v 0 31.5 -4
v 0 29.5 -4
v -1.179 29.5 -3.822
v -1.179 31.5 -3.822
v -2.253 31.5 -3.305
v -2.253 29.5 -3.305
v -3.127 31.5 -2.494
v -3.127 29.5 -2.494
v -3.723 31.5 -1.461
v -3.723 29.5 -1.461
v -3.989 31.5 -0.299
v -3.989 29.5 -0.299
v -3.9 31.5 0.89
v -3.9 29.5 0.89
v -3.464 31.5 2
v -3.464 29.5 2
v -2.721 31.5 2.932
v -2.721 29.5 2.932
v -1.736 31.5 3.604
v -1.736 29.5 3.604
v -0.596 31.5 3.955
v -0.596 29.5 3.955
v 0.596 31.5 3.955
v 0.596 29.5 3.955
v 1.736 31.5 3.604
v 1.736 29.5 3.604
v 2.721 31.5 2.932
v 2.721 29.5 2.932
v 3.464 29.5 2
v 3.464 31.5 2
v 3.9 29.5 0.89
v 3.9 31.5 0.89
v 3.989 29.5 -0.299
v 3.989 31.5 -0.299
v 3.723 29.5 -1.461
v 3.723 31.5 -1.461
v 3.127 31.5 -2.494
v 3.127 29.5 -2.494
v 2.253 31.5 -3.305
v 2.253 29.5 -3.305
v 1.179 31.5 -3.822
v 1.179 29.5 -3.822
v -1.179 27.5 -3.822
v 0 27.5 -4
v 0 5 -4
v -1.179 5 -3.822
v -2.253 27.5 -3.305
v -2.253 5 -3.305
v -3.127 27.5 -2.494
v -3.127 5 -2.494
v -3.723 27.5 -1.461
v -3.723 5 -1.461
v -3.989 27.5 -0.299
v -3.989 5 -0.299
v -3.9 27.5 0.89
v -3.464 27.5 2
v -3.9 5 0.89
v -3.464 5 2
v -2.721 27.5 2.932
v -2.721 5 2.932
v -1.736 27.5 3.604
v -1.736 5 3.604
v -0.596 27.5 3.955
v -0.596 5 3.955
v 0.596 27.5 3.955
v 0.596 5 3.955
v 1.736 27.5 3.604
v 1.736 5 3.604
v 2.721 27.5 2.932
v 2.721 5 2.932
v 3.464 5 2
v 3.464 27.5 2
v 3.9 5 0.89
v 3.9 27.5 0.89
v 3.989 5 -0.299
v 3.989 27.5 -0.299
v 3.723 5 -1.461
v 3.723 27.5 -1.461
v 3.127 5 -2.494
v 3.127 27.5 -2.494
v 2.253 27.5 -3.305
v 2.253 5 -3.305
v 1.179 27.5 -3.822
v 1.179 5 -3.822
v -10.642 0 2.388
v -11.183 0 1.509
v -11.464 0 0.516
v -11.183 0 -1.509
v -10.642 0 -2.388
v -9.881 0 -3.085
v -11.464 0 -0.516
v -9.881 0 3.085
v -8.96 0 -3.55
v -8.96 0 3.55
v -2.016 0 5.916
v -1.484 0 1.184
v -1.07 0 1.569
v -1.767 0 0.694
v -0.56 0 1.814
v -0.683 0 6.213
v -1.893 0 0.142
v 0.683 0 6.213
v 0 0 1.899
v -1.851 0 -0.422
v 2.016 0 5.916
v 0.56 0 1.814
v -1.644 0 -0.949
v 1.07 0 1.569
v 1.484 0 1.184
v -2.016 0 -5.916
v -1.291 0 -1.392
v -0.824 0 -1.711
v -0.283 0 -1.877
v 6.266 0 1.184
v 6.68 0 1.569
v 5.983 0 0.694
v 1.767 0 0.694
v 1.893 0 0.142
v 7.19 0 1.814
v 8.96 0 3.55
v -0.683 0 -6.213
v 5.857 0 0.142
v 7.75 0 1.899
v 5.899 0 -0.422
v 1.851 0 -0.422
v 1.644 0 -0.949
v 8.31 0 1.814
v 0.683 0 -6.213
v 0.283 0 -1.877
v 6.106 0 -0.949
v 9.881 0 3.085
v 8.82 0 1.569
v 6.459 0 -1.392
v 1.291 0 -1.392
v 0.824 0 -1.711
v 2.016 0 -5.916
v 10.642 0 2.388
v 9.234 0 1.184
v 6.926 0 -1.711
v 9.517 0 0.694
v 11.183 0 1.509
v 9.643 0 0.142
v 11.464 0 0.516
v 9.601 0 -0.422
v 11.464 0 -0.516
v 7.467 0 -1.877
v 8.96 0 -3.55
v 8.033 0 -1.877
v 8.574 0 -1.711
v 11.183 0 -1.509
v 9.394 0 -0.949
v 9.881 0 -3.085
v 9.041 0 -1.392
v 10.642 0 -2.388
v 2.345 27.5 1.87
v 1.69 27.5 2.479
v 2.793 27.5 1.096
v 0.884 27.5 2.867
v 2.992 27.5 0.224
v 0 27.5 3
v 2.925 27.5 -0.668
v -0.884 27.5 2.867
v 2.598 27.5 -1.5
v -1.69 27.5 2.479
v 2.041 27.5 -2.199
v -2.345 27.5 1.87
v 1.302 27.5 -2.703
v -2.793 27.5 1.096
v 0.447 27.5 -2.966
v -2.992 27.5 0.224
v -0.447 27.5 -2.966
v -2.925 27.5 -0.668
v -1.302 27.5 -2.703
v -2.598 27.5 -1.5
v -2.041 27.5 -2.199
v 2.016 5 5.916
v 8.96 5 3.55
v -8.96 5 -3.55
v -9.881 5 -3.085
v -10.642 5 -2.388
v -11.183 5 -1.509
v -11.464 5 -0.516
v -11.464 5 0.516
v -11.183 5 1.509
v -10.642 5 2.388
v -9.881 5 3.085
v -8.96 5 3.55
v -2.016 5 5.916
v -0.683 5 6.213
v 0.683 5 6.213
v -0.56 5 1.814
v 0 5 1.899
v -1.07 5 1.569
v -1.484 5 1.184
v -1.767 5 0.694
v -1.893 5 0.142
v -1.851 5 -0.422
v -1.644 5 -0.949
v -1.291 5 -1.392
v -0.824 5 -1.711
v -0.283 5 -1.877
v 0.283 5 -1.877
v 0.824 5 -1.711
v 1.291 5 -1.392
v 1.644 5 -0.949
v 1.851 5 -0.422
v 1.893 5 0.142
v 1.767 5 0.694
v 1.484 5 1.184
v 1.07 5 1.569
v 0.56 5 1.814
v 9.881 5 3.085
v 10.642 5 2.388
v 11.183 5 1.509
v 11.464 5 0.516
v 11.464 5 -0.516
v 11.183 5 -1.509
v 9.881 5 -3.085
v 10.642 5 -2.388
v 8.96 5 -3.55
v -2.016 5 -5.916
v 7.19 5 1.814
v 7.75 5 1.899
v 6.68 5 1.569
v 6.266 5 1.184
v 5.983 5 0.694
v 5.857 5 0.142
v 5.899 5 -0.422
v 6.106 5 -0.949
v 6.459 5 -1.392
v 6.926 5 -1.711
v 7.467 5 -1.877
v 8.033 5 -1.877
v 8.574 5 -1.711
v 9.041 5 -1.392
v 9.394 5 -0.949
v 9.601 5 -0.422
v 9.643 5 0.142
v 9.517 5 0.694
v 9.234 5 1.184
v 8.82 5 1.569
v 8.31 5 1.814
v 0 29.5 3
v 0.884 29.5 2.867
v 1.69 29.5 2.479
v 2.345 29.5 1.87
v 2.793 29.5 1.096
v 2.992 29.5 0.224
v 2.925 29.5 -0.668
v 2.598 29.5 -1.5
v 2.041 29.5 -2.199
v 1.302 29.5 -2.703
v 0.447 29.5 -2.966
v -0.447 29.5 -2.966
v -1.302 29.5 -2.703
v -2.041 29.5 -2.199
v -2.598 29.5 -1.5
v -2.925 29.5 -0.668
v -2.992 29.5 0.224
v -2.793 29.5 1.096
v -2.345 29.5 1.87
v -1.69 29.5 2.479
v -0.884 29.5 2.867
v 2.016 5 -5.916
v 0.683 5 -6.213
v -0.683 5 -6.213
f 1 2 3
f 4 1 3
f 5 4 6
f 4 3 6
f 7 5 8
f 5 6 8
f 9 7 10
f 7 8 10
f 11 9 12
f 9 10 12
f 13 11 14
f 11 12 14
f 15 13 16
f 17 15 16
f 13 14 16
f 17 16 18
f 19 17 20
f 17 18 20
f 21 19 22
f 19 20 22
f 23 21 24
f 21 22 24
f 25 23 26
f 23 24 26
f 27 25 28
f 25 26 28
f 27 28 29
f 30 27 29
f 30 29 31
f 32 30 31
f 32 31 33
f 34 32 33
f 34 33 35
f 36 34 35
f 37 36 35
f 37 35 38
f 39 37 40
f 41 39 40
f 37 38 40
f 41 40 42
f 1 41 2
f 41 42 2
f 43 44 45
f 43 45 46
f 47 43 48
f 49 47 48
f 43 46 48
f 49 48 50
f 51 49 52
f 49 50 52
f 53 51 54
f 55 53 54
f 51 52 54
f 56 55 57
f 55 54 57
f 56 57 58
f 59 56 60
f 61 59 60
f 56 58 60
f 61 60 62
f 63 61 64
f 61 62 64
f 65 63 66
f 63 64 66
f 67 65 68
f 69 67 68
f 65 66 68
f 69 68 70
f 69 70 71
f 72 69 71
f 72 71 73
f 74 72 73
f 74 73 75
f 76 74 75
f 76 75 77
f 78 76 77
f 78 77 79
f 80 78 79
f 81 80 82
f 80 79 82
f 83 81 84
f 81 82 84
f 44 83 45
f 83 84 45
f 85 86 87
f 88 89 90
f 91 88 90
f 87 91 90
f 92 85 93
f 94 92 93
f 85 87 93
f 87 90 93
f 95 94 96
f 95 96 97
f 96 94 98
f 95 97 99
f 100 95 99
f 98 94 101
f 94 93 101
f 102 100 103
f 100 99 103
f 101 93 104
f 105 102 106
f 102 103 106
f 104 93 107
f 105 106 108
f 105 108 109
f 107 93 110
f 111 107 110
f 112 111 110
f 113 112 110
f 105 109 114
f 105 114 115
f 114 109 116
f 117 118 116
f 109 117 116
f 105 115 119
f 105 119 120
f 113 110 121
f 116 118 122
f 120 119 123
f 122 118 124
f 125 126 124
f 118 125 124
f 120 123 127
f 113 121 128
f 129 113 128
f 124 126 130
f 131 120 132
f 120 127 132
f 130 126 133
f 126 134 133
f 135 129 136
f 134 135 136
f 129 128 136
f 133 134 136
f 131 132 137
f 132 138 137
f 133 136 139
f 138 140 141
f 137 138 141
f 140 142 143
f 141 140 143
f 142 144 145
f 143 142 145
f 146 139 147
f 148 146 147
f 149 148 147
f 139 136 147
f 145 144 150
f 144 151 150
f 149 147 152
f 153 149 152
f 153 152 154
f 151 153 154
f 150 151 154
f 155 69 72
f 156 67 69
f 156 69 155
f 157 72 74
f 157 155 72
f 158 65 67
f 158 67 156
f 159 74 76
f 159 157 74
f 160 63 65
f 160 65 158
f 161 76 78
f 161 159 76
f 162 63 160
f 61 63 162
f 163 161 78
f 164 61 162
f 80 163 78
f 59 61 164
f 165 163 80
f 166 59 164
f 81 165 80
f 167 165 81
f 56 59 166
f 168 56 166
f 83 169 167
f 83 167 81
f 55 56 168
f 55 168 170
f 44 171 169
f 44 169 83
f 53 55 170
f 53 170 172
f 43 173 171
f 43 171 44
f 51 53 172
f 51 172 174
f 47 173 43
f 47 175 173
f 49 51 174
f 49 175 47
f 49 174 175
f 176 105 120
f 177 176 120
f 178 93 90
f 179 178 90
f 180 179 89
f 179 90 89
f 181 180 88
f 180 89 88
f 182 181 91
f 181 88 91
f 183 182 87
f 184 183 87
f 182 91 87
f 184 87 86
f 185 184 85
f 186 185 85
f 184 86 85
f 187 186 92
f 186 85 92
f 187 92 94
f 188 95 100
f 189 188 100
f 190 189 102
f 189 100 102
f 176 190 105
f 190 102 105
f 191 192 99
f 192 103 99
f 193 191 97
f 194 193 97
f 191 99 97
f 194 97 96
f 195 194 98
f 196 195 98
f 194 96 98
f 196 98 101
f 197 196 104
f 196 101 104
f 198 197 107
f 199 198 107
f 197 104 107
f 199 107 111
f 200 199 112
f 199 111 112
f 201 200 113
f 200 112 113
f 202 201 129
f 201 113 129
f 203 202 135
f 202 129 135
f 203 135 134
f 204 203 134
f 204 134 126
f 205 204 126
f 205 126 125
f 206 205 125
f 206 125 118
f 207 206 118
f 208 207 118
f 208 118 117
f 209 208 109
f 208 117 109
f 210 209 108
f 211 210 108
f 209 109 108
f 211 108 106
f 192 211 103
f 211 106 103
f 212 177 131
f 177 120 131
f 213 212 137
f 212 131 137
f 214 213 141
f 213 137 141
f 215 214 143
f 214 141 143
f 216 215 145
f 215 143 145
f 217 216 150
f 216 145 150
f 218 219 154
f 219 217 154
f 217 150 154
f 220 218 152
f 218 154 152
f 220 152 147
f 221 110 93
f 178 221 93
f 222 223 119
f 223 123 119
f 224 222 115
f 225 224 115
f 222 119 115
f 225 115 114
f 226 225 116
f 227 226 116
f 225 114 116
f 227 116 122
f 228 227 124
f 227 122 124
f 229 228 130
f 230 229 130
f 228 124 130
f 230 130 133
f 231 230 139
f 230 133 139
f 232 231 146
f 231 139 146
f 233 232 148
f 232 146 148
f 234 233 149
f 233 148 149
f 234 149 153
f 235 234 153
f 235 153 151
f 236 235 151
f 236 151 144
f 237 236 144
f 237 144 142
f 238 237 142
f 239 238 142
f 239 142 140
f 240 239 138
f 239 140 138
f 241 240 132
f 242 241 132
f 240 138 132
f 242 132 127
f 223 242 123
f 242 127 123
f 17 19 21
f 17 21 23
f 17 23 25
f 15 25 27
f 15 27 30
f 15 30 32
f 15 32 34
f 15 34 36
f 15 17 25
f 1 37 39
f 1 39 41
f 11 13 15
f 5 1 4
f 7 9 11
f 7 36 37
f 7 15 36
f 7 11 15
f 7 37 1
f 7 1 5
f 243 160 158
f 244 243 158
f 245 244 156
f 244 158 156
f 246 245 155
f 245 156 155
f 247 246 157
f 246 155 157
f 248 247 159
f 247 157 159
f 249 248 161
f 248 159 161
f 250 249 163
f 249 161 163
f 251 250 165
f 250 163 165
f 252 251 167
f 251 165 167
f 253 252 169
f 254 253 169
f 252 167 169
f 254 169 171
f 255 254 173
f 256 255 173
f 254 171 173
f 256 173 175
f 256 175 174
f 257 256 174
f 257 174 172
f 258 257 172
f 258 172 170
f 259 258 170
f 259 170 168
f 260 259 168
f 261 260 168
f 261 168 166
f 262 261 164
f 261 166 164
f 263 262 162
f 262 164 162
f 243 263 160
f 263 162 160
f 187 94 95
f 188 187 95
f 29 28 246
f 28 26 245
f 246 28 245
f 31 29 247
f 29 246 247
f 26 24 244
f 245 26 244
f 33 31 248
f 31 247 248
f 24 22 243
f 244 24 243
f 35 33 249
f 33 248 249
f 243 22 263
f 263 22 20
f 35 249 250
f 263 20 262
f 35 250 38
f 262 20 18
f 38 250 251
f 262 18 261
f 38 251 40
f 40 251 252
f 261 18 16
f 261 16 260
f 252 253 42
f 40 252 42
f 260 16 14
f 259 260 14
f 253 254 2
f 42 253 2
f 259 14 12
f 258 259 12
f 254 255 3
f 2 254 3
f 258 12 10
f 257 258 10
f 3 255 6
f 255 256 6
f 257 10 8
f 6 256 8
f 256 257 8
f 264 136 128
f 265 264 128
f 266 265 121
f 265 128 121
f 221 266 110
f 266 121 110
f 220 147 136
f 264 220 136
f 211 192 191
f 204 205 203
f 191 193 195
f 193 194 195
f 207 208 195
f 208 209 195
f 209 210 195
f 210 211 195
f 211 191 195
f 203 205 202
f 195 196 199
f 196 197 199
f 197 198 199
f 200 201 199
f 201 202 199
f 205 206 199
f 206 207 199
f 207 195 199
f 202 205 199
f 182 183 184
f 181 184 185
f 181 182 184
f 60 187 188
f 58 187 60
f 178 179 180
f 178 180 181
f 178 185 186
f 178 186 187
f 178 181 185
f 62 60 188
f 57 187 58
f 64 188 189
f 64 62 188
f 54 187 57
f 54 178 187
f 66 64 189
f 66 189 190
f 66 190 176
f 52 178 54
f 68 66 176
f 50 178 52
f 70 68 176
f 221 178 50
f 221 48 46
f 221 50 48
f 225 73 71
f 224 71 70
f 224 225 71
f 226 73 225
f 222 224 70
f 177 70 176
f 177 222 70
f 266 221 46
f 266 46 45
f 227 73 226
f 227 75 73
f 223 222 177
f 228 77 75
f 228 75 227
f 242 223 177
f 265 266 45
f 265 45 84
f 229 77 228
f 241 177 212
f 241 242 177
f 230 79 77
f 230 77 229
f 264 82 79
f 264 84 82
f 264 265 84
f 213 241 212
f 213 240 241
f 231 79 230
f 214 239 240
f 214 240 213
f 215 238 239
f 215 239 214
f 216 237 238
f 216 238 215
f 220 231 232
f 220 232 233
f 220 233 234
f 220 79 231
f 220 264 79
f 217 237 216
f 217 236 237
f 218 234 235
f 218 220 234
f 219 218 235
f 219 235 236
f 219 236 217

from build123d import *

# Parameters (mm, degrees)
SKETCH1_R                      = 6.25
SKETCH1_R_2                    = 3.75
SKETCH1_R_3                    = 2.5
BOSS_EXTRUDE1_DEPTH            = 5
SKETCH2_R                      = 4
BOSS_EXTRUDE2_DEPTH            = 22.5
SKETCH3_R                      = 3
BOSS_EXTRUDE3_DEPTH            = 2
SKETCH4_R                      = 4
BOSS_EXTRUDE4_DEPTH            = 2
SKETCH6_W                      = 1.89865
SKETCH6_H                      = 5
F_6_CLEARANCE_HOLE1_AT_2_COUNT = 2
F_6_CLEARANCE_HOLE1_AT_2_PITCH = 7.75


with BuildPart() as part:
    # Sketch1 → Boss-Extrude1 (new body)
    # profile 1 of 15: a face of its own
    with BuildSketch(Plane(origin=(0, 0, 0), x_dir=(1, 0, 0), z_dir=(0, 1, 0))):
        Circle(SKETCH1_R)
    # profile 2 of 15: a face of its own
    with BuildSketch(Plane(origin=(0, 0, 0), x_dir=(1, 0, 0), z_dir=(0, 1, 0))):
        with Locations((-7.75, 0)):
            Circle(SKETCH1_R_2)
        with Locations((-7.75, 0)):
            Circle(SKETCH1_R_3, mode=Mode.SUBTRACT)
    # profile 3 of 15: a face of its own
    with BuildSketch(Plane(origin=(0, 0, 0), x_dir=(1, 0, 0), z_dir=(0, 1, 0))):
        Circle(SKETCH1_R)
    # profile 4 of 15: a face of its own
    with BuildSketch(Plane(origin=(0, 0, 0), x_dir=(1, 0, 0), z_dir=(0, 1, 0))):
        with Locations((-7.75, 0)):
            Circle(SKETCH1_R_2)
        with Locations((-7.75, 0)):
            Circle(SKETCH1_R_3, mode=Mode.SUBTRACT)
    # profile 5 of 15: a face of its own
    with BuildSketch(Plane(origin=(0, 0, 0), x_dir=(1, 0, 0), z_dir=(0, 1, 0))):
        with Locations((7.75, 0)):
            Circle(SKETCH1_R_2)
    # profile 6 of 15: a face of its own
    with BuildSketch(Plane(origin=(0, 0, 0), x_dir=(1, 0, 0), z_dir=(0, 1, 0))):
        Circle(SKETCH1_R)
    # profile 7 of 15: a face of its own
    with BuildSketch(Plane(origin=(0, 0, 0), x_dir=(1, 0, 0), z_dir=(0, 1, 0))):
        with Locations((-7.75, 0)):
            Circle(SKETCH1_R_2)
    # profile 8 of 15: a face of its own
    with BuildSketch(Plane(origin=(0, 0, 0), x_dir=(1, 0, 0), z_dir=(0, 1, 0))):
        with BuildLine():
            ThreePointArc((-5.487903226, -2.990889196), (-7.15425073, -3.702375293), (-8.959677419, -3.54953244))
            Line((-8.959677419, -3.54953244), (-2.016129032, -5.9158874))
            ThreePointArc((-2.016129032, -5.9158874), (-4.026975125, -4.77974595), (-5.487903226, -2.990889196))
        make_face()
    # profile 9 of 15: a face of its own
    with BuildSketch(Plane(origin=(0, 0, 0), x_dir=(1, 0, 0), z_dir=(0, 1, 0))):
        with BuildLine():
            ThreePointArc((5.487903226, -2.990889196), (4.026975125, -4.77974595), (2.016129032, -5.9158874))
            Line((2.016129032, -5.9158874), (8.959677419, -3.54953244))
            ThreePointArc((8.959677419, -3.54953244), (7.15425073, -3.702375293), (5.487903226, -2.990889196))
        make_face()
    # profile 10 of 15: a face of its own
    with BuildSketch(Plane(origin=(0, 0, 0), x_dir=(1, 0, 0), z_dir=(0, 1, 0))):
        Circle(SKETCH1_R)
    # profile 11 of 15: a face of its own
    with BuildSketch(Plane(origin=(0, 0, 0), x_dir=(1, 0, 0), z_dir=(0, 1, 0))):
        with Locations((7.75, 0)):
            Circle(SKETCH1_R_2)
        with Locations((7.75, 0)):
            Circle(SKETCH1_R_3, mode=Mode.SUBTRACT)
    # profile 12 of 15: a face of its own
    with BuildSketch(Plane(origin=(0, 0, 0), x_dir=(1, 0, 0), z_dir=(0, 1, 0))):
        with Locations((7.75, 0)):
            Circle(SKETCH1_R_2)
        with Locations((7.75, 0)):
            Circle(SKETCH1_R_3, mode=Mode.SUBTRACT)
    # profile 13 of 15: a face of its own
    with BuildSketch(Plane(origin=(0, 0, 0), x_dir=(1, 0, 0), z_dir=(0, 1, 0))):
        Circle(SKETCH1_R)
    # profile 14 of 15: a face of its own
    with BuildSketch(Plane(origin=(0, 0, 0), x_dir=(1, 0, 0), z_dir=(0, 1, 0))):
        with BuildLine():
            Line((8.959677419, 3.54953244), (2.016129032, 5.9158874))
            ThreePointArc((2.016129032, 5.9158874), (4.026975125, 4.77974595), (5.487903226, 2.990889196))
            ThreePointArc((5.487903226, 2.990889196), (7.15425073, 3.702375293), (8.959677419, 3.54953244))
        make_face()
    # profile 15 of 15: a face of its own
    with BuildSketch(Plane(origin=(0, 0, 0), x_dir=(1, 0, 0), z_dir=(0, 1, 0))):
        with BuildLine():
            Line((-2.016129032, 5.9158874), (-8.959677419, 3.54953244))
            ThreePointArc((-8.959677419, 3.54953244), (-7.15425073, 3.702375293), (-5.487903226, 2.990889196))
            ThreePointArc((-5.487903226, 2.990889196), (-4.026975125, 4.77974595), (-2.016129032, 5.9158874))
        make_face()
    extrude(amount=BOSS_EXTRUDE1_DEPTH)

    # Sketch2 → Boss-Extrude2 (add)
    with BuildSketch(Plane(origin=(0, 5, 0), x_dir=(1, 0, 0), z_dir=(0, 1, 0))):
        with Locations(Location((0, 0, 0), (0, 0, 90))):
            Circle(SKETCH2_R)
    extrude(amount=BOSS_EXTRUDE2_DEPTH)

    # Sketch3 → Boss-Extrude3 (add)
    with BuildSketch(Plane(origin=(0, 27.5, 0), x_dir=(1, 0, 0), z_dir=(0, 1, 0))):
        with Locations(Location((0, 0, 0), (0, 0, 270))):
            Circle(SKETCH3_R)
    extrude(amount=BOSS_EXTRUDE3_DEPTH)

    # Sketch4 → Boss-Extrude4 (add)
    with BuildSketch(Plane(origin=(0, 29.5, 0), x_dir=(1, 0, 0), z_dir=(0, 1, 0))):
        with Locations(Location((0, 0, 0), (0, 0, 90))):
            Circle(SKETCH4_R)
    extrude(amount=BOSS_EXTRUDE4_DEPTH)

    # Sketch6 → #6 Clearance Hole1 (revolve, cut)
    with BuildSketch(Plane(origin=(7.75, 5, 0), x_dir=(0, 0, 1), z_dir=(1, 0, 0))):
        with Locations((0.949325, 2.5)):
            Rectangle(SKETCH6_W, SKETCH6_H)
    f_6_clearance_hole1 = revolve(axis=Axis((7.75, 11.35, 0), (0, -1, 0)), mode=Mode.SUBTRACT)

    # #6 Clearance Hole1 at 2: #6 Clearance Hole1 ×2
    with Locations(*[(-i * F_6_CLEARANCE_HOLE1_AT_2_PITCH, 0, 0) for i in range(1, F_6_CLEARANCE_HOLE1_AT_2_COUNT)]):
        add(f_6_clearance_hole1, mode=Mode.SUBTRACT)


solid = part.part
